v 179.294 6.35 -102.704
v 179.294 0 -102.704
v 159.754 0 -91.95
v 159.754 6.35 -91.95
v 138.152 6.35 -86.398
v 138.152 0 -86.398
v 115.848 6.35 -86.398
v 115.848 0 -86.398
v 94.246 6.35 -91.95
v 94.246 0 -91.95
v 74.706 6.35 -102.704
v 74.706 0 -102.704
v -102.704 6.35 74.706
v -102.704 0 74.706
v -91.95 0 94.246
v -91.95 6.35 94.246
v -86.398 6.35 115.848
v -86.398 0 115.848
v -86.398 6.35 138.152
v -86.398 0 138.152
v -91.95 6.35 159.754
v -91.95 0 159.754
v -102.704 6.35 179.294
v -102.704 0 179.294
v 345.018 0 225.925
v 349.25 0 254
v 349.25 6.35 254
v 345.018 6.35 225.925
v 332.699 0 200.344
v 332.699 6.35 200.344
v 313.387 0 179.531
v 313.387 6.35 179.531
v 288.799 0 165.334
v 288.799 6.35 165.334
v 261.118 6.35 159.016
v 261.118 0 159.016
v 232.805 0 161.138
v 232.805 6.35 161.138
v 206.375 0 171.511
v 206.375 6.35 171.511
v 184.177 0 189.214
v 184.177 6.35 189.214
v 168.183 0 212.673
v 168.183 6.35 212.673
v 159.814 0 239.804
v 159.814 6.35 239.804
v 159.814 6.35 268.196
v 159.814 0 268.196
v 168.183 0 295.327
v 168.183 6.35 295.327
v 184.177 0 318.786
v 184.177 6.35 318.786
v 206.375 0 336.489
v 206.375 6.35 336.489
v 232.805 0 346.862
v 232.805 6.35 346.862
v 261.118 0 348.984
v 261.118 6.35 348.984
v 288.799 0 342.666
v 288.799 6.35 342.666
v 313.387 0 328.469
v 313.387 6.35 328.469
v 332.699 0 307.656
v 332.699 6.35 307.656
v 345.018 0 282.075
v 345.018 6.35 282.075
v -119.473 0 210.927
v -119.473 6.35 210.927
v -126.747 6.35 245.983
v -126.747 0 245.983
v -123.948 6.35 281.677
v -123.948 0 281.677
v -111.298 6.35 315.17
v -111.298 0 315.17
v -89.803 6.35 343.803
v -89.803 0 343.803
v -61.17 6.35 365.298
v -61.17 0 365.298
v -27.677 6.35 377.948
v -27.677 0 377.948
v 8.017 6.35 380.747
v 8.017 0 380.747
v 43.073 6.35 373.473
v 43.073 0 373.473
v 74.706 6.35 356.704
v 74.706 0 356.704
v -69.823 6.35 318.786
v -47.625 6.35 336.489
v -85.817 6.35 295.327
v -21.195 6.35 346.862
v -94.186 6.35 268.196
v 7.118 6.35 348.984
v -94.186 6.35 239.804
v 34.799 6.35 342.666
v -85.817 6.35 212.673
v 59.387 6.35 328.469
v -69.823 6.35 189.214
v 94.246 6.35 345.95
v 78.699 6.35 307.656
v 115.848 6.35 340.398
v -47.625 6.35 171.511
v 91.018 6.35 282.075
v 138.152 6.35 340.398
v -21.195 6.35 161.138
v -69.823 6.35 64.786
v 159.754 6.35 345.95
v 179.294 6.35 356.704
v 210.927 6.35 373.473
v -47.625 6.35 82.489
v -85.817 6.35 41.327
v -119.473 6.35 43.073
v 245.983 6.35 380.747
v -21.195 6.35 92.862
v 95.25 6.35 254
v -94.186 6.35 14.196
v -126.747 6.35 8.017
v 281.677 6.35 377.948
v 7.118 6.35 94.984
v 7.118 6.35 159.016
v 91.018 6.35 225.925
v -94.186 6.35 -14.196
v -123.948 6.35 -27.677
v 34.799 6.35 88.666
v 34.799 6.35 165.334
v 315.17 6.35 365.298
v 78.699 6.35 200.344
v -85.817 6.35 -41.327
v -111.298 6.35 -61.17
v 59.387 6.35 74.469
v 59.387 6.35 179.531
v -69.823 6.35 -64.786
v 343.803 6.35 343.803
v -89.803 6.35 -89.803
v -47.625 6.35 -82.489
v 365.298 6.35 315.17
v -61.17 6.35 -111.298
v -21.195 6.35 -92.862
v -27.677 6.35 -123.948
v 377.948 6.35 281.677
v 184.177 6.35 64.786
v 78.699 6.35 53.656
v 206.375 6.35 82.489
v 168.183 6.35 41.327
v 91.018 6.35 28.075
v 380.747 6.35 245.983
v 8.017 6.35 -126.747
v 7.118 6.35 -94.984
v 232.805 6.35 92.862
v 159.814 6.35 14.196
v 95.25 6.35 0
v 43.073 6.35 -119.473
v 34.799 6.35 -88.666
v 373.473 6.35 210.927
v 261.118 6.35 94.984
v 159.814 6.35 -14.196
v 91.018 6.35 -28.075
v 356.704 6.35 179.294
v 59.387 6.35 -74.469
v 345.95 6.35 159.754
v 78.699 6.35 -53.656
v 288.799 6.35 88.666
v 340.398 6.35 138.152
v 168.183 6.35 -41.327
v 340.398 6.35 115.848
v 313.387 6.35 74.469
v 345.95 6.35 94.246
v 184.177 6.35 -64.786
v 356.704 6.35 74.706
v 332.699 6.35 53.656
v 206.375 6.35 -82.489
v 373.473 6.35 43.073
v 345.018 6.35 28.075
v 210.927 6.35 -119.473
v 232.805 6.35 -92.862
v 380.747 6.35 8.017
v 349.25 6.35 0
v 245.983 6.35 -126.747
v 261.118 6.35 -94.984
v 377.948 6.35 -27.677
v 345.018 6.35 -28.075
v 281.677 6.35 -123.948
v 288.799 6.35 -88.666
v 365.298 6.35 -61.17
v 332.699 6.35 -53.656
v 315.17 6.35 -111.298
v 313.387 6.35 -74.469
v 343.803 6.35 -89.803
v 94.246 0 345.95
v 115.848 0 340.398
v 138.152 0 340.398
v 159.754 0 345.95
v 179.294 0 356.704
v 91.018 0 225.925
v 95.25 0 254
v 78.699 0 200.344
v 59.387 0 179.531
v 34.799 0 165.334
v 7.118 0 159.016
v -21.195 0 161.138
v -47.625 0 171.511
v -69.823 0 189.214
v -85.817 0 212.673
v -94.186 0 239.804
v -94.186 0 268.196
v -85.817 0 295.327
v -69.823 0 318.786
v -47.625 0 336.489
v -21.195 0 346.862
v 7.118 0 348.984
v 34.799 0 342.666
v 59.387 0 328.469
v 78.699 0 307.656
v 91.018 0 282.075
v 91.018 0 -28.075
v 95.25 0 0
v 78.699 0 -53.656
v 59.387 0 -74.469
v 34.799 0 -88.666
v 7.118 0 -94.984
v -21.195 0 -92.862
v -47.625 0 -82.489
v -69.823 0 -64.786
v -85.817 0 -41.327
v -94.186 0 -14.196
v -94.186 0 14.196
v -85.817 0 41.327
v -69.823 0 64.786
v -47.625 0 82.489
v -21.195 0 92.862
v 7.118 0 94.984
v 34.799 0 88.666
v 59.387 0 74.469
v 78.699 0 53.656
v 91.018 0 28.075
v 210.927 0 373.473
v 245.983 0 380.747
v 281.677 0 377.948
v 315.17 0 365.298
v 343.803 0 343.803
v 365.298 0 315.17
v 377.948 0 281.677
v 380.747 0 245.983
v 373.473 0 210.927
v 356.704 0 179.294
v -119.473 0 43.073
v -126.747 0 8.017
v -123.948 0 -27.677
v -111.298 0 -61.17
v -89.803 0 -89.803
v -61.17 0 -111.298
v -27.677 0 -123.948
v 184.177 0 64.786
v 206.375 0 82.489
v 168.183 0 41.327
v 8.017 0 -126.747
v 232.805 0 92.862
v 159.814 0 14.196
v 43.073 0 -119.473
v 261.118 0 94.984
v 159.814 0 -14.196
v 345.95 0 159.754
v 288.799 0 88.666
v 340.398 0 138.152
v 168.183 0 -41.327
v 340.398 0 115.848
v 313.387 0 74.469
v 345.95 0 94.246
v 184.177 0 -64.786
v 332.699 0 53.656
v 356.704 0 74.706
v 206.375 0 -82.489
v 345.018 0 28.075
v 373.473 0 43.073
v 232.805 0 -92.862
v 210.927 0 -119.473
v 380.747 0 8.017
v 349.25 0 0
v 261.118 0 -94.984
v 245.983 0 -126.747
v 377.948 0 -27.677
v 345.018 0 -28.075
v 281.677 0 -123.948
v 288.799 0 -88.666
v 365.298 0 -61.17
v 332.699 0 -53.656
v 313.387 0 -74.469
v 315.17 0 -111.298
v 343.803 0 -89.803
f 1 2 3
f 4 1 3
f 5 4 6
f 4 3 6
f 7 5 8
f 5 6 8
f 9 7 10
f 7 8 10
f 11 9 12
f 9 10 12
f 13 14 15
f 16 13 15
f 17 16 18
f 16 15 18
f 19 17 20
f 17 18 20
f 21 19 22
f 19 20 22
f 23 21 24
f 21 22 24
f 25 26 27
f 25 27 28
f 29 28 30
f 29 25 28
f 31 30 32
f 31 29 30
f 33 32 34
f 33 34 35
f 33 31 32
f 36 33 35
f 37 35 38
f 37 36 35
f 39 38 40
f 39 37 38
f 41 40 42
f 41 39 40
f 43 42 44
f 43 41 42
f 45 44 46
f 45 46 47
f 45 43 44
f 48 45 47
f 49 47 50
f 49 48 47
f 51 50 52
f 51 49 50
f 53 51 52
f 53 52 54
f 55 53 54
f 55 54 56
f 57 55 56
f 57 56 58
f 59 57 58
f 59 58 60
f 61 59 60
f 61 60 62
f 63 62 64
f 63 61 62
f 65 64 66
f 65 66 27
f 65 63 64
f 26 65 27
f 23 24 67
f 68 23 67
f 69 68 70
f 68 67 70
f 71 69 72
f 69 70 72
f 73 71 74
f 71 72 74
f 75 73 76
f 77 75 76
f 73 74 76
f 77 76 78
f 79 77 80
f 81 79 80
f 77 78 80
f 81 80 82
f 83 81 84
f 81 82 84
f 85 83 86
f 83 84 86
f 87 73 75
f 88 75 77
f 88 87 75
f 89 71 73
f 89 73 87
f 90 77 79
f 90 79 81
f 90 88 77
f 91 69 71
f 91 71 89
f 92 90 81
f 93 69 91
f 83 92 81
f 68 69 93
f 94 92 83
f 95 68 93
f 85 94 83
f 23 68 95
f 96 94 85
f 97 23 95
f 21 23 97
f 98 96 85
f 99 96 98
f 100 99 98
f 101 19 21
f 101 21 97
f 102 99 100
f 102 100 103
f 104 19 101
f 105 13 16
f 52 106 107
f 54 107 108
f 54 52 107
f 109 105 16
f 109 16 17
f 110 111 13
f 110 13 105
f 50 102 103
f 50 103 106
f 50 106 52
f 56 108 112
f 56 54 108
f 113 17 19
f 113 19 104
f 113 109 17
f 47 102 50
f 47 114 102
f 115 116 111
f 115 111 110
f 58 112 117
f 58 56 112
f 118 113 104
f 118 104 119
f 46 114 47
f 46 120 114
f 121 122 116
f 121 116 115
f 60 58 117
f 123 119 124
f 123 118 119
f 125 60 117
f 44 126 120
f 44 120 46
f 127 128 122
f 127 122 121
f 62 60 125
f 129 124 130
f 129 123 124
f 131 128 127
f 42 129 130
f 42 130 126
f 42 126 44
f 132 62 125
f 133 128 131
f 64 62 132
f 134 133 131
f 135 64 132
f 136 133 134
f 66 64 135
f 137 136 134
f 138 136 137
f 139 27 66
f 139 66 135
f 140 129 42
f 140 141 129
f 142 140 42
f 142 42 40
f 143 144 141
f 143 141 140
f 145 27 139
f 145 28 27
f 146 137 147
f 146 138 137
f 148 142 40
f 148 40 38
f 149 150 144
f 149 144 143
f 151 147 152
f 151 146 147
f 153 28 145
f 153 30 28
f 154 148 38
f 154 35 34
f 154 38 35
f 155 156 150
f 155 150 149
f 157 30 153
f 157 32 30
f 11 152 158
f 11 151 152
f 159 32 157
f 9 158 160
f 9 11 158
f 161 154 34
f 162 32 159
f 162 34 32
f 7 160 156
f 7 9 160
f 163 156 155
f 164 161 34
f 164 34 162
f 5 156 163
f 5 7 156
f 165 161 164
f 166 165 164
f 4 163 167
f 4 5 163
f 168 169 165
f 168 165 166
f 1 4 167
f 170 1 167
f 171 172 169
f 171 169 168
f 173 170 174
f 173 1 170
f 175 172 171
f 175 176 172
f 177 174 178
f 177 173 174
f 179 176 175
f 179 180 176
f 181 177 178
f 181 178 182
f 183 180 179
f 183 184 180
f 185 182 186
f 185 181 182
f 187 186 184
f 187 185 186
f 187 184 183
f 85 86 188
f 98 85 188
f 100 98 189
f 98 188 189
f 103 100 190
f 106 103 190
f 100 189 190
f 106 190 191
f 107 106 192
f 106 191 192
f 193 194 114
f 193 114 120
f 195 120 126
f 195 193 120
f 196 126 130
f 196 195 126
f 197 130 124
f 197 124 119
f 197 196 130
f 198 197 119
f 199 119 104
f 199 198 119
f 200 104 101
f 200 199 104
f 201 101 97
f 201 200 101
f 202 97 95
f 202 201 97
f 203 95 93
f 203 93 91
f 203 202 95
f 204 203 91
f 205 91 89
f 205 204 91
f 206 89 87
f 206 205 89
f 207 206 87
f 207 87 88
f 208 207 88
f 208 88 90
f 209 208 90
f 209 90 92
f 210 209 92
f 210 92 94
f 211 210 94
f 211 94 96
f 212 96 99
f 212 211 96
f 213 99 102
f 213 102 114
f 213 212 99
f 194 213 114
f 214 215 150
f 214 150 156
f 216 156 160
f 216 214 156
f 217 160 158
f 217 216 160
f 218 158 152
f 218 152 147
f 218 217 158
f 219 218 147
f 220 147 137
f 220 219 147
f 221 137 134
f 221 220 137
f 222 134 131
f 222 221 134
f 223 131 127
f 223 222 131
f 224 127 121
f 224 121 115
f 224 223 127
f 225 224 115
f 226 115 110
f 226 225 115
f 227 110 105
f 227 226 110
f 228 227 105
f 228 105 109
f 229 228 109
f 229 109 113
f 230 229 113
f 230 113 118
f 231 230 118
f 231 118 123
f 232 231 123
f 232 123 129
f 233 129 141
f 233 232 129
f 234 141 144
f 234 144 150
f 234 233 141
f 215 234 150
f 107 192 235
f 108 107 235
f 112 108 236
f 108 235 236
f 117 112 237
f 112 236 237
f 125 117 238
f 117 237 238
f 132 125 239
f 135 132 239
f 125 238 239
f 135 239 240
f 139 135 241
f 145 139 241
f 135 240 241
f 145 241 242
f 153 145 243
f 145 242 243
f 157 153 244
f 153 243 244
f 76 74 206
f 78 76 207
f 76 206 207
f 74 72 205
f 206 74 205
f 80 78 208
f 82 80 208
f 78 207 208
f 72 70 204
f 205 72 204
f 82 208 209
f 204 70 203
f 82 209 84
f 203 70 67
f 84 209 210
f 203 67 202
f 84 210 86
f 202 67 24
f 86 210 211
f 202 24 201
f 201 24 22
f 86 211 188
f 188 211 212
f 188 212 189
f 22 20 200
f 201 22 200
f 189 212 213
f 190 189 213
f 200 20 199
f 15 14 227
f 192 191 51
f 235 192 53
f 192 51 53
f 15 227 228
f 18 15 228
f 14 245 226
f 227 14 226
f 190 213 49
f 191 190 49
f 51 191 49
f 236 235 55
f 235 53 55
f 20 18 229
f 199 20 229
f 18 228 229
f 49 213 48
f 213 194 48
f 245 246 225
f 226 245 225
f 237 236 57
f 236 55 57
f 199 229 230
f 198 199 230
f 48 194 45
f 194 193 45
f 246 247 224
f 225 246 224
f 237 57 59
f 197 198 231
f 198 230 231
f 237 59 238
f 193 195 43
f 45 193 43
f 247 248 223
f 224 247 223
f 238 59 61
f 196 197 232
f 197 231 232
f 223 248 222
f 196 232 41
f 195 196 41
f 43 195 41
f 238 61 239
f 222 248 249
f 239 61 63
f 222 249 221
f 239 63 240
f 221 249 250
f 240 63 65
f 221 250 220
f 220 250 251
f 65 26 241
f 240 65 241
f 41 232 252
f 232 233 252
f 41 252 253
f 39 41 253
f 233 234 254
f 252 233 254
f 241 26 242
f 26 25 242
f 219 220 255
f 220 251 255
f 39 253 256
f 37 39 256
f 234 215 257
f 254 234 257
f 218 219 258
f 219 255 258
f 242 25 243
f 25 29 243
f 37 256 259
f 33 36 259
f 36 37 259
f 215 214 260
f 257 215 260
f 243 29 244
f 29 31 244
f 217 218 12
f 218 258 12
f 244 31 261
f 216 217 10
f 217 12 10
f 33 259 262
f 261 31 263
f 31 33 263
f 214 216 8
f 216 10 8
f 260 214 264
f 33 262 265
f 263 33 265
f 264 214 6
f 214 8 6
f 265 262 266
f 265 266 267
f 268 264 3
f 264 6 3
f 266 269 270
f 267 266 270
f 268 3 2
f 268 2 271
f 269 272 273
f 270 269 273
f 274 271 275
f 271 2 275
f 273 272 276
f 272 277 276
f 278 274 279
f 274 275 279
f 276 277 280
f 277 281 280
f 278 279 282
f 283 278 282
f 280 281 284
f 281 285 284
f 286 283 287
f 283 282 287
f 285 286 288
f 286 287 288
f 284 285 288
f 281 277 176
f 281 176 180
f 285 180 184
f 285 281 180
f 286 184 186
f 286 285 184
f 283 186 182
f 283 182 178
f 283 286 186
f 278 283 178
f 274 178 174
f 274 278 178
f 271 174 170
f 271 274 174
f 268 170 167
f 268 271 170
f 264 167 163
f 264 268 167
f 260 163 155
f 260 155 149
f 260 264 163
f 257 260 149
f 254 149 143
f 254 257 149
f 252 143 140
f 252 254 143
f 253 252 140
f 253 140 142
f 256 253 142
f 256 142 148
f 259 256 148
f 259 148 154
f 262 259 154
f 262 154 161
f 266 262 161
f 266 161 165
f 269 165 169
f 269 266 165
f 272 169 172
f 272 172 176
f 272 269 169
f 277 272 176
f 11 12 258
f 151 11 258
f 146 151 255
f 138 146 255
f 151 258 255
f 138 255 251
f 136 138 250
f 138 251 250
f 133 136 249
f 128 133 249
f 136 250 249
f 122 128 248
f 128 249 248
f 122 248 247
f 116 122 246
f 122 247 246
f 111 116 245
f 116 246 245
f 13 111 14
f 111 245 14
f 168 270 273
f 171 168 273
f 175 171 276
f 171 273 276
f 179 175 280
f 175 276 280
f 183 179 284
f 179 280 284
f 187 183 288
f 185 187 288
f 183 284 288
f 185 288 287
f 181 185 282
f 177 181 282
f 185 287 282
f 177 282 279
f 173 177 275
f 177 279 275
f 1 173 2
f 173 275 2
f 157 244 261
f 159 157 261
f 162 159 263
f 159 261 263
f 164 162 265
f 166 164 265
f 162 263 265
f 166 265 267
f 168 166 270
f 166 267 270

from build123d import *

# Parameters (mm, degrees)
SKETCH1_R           = 95.25
BOSS_EXTRUDE1_DEPTH = 6.35


with BuildPart() as part:
    # Sketch1 → Boss-Extrude1 (new body)
    with BuildSketch(Plane(origin=(0, 0, 0), x_dir=(1, 0, 0), z_dir=(0, 1, 0))):
        with BuildLine():
            ThreePointArc((74.705882353, 102.703608222), (-89.802561211, 89.802561211), (-102.703608222, -74.705882353))
            ThreePointArc((-102.703608222, -74.705882353), (-85.696133978, -127), (-102.703608222, -179.294117647))
            ThreePointArc((-102.703608222, -179.294117647), (-89.802561211, -343.802561211), (74.705882353, -356.703608222))
            ThreePointArc((74.705882353, -356.703608222), (127, -339.696133978), (179.294117647, -356.703608222))
            ThreePointArc((179.294117647, -356.703608222), (343.802561211, -343.802561211), (356.703608222, -179.294117647))
            ThreePointArc((356.703608222, -179.294117647), (339.696133978, -127), (356.703608222, -74.705882353))
            ThreePointArc((356.703608222, -74.705882353), (343.802561211, 89.802561211), (179.294117647, 102.703608222))
            ThreePointArc((179.294117647, 102.703608222), (127, 85.696133978), (74.705882353, 102.703608222))
        make_face()
        Circle(SKETCH1_R, mode=Mode.SUBTRACT)
        with Locations((254, 0)):
            Circle(SKETCH1_R, mode=Mode.SUBTRACT)
        with Locations((254, -254)):
            Circle(SKETCH1_R, mode=Mode.SUBTRACT)
        with Locations((0, -254)):
            Circle(SKETCH1_R, mode=Mode.SUBTRACT)
    extrude(amount=BOSS_EXTRUDE1_DEPTH)


solid = part.part
